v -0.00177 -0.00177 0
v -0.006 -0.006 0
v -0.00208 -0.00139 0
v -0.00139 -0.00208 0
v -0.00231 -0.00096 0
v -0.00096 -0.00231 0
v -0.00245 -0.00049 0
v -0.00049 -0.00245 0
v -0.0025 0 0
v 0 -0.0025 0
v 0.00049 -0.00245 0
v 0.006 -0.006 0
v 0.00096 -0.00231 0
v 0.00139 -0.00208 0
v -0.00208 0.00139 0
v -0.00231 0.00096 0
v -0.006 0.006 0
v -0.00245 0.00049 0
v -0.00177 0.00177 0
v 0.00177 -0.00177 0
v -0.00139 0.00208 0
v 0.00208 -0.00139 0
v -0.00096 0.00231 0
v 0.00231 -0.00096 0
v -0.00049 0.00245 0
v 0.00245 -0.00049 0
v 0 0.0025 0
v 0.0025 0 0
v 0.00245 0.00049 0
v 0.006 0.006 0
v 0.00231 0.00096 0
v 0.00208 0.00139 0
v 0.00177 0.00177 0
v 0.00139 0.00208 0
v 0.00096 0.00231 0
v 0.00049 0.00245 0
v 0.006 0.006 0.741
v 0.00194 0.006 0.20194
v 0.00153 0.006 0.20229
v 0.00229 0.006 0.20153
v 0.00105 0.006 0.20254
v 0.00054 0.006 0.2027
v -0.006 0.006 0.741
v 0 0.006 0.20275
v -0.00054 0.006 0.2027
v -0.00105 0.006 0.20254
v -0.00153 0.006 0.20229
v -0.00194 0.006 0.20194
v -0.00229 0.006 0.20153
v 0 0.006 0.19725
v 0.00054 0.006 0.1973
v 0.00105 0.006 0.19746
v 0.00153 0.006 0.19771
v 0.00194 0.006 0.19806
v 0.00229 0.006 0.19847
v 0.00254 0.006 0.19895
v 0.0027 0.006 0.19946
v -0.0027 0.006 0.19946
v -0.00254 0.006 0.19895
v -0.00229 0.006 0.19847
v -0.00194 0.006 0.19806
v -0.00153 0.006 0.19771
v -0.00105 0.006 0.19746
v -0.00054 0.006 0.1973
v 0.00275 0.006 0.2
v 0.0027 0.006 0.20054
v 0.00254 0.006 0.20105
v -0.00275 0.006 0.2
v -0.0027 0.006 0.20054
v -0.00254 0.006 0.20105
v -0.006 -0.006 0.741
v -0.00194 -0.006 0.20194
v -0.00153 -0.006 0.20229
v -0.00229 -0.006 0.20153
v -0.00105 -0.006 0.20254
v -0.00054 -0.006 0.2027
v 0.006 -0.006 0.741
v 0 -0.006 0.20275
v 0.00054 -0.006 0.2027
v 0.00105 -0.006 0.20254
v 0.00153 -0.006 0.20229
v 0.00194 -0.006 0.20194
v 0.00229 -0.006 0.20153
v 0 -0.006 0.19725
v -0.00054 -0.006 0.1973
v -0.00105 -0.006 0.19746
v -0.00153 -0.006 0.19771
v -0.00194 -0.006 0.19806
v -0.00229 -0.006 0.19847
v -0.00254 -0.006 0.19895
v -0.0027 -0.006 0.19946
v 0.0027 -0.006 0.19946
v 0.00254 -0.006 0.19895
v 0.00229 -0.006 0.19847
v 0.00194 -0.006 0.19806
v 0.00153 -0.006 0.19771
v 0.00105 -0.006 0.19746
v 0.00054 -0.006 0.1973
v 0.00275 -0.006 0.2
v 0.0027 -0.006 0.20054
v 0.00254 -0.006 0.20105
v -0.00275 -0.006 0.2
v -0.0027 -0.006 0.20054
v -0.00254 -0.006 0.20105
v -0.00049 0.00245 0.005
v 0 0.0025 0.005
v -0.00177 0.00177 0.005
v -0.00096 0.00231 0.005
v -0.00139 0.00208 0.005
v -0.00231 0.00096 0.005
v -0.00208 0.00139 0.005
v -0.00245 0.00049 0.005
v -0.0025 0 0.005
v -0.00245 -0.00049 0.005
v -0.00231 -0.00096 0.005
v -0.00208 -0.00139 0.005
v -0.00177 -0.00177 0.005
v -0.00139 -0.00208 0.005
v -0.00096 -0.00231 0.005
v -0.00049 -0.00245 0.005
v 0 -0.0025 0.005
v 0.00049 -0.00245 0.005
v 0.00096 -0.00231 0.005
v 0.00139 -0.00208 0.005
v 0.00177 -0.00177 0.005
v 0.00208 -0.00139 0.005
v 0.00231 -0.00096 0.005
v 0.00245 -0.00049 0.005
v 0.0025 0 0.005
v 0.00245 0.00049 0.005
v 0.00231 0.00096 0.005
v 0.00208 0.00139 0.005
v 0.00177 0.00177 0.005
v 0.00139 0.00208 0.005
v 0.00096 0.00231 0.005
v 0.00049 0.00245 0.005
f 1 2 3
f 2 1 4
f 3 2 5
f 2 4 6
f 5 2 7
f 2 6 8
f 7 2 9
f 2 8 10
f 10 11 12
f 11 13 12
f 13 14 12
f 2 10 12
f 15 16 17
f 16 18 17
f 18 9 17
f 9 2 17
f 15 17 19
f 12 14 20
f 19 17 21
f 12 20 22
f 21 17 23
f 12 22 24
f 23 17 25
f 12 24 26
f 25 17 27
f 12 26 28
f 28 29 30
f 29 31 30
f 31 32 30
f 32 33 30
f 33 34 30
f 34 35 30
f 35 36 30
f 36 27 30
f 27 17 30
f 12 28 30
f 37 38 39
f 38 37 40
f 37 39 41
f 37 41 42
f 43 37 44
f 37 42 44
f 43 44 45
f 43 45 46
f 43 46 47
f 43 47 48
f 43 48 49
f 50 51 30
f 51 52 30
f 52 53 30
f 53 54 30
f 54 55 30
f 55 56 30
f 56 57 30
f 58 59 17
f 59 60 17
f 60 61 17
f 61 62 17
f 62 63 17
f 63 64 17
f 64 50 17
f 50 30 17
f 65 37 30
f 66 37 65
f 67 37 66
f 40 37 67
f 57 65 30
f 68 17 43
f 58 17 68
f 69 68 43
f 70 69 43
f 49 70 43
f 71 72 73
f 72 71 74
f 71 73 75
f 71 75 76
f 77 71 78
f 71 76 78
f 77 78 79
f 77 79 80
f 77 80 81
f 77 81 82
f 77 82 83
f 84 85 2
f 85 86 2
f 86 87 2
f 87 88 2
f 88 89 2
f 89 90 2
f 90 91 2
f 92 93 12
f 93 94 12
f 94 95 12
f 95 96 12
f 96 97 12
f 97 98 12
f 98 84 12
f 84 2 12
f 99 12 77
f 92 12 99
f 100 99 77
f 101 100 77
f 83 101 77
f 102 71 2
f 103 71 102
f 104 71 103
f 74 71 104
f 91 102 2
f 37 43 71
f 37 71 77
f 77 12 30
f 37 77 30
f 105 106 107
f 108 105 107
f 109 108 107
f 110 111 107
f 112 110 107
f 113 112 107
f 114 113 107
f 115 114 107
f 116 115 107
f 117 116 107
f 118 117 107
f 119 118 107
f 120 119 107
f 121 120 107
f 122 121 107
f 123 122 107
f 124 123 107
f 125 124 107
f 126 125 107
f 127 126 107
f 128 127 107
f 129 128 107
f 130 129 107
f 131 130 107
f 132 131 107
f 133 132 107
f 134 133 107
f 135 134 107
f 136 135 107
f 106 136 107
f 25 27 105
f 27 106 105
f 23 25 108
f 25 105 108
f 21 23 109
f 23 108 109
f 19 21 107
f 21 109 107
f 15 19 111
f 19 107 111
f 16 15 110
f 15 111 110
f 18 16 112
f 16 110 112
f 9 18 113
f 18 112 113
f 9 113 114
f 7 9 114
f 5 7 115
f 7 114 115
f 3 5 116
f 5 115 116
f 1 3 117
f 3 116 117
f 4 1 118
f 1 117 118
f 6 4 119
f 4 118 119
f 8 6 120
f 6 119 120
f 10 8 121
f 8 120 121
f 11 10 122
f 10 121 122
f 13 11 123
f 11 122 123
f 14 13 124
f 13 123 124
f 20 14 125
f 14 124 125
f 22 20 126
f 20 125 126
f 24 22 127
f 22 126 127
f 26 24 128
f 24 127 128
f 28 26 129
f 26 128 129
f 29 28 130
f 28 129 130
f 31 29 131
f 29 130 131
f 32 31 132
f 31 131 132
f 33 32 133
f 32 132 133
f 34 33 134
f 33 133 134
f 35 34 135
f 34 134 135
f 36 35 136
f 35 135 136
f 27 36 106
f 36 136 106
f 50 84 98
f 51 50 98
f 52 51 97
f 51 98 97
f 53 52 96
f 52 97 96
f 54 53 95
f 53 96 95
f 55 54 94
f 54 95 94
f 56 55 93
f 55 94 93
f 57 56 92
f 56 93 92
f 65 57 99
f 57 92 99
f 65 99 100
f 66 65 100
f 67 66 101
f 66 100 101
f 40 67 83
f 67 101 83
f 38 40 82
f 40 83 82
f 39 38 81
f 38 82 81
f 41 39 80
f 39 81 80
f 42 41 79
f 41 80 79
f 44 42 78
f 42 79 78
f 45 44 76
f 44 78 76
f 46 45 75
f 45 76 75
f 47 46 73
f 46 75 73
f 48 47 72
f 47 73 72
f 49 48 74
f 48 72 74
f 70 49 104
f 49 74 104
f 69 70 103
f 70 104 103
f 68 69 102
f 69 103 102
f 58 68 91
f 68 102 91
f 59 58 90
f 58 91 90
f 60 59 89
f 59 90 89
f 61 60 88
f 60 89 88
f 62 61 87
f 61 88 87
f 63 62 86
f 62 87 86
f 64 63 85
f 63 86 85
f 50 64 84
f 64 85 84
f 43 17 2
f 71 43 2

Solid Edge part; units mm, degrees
sketch "Sketch1" plane through (0, 0, 0) normal (0, 0, 1) x (1, 0, 0)
  line L0 (-0.006, -0.006) -> (0.006, -0.006)
  line L1 (0.006, -0.006) -> (0.006, 0.006)
  line L2 (0.006, 0.006) -> (-0.006, 0.006)
  line L3 (-0.006, 0.006) -> (-0.006, -0.006)
  dimension "D1" = 0.012
extrude "Protrusion1" add sketch "Sketch1" along normal blind 0.741
hole "Bohrung_1" at (0, -0.006, 0.2) direction (0, 1, 0) diameter 0.0055 end through all
hole "Bohrung_2" at (0, 0, 0) direction (0, 0, 1) diameter 0.005 depth 0.005
